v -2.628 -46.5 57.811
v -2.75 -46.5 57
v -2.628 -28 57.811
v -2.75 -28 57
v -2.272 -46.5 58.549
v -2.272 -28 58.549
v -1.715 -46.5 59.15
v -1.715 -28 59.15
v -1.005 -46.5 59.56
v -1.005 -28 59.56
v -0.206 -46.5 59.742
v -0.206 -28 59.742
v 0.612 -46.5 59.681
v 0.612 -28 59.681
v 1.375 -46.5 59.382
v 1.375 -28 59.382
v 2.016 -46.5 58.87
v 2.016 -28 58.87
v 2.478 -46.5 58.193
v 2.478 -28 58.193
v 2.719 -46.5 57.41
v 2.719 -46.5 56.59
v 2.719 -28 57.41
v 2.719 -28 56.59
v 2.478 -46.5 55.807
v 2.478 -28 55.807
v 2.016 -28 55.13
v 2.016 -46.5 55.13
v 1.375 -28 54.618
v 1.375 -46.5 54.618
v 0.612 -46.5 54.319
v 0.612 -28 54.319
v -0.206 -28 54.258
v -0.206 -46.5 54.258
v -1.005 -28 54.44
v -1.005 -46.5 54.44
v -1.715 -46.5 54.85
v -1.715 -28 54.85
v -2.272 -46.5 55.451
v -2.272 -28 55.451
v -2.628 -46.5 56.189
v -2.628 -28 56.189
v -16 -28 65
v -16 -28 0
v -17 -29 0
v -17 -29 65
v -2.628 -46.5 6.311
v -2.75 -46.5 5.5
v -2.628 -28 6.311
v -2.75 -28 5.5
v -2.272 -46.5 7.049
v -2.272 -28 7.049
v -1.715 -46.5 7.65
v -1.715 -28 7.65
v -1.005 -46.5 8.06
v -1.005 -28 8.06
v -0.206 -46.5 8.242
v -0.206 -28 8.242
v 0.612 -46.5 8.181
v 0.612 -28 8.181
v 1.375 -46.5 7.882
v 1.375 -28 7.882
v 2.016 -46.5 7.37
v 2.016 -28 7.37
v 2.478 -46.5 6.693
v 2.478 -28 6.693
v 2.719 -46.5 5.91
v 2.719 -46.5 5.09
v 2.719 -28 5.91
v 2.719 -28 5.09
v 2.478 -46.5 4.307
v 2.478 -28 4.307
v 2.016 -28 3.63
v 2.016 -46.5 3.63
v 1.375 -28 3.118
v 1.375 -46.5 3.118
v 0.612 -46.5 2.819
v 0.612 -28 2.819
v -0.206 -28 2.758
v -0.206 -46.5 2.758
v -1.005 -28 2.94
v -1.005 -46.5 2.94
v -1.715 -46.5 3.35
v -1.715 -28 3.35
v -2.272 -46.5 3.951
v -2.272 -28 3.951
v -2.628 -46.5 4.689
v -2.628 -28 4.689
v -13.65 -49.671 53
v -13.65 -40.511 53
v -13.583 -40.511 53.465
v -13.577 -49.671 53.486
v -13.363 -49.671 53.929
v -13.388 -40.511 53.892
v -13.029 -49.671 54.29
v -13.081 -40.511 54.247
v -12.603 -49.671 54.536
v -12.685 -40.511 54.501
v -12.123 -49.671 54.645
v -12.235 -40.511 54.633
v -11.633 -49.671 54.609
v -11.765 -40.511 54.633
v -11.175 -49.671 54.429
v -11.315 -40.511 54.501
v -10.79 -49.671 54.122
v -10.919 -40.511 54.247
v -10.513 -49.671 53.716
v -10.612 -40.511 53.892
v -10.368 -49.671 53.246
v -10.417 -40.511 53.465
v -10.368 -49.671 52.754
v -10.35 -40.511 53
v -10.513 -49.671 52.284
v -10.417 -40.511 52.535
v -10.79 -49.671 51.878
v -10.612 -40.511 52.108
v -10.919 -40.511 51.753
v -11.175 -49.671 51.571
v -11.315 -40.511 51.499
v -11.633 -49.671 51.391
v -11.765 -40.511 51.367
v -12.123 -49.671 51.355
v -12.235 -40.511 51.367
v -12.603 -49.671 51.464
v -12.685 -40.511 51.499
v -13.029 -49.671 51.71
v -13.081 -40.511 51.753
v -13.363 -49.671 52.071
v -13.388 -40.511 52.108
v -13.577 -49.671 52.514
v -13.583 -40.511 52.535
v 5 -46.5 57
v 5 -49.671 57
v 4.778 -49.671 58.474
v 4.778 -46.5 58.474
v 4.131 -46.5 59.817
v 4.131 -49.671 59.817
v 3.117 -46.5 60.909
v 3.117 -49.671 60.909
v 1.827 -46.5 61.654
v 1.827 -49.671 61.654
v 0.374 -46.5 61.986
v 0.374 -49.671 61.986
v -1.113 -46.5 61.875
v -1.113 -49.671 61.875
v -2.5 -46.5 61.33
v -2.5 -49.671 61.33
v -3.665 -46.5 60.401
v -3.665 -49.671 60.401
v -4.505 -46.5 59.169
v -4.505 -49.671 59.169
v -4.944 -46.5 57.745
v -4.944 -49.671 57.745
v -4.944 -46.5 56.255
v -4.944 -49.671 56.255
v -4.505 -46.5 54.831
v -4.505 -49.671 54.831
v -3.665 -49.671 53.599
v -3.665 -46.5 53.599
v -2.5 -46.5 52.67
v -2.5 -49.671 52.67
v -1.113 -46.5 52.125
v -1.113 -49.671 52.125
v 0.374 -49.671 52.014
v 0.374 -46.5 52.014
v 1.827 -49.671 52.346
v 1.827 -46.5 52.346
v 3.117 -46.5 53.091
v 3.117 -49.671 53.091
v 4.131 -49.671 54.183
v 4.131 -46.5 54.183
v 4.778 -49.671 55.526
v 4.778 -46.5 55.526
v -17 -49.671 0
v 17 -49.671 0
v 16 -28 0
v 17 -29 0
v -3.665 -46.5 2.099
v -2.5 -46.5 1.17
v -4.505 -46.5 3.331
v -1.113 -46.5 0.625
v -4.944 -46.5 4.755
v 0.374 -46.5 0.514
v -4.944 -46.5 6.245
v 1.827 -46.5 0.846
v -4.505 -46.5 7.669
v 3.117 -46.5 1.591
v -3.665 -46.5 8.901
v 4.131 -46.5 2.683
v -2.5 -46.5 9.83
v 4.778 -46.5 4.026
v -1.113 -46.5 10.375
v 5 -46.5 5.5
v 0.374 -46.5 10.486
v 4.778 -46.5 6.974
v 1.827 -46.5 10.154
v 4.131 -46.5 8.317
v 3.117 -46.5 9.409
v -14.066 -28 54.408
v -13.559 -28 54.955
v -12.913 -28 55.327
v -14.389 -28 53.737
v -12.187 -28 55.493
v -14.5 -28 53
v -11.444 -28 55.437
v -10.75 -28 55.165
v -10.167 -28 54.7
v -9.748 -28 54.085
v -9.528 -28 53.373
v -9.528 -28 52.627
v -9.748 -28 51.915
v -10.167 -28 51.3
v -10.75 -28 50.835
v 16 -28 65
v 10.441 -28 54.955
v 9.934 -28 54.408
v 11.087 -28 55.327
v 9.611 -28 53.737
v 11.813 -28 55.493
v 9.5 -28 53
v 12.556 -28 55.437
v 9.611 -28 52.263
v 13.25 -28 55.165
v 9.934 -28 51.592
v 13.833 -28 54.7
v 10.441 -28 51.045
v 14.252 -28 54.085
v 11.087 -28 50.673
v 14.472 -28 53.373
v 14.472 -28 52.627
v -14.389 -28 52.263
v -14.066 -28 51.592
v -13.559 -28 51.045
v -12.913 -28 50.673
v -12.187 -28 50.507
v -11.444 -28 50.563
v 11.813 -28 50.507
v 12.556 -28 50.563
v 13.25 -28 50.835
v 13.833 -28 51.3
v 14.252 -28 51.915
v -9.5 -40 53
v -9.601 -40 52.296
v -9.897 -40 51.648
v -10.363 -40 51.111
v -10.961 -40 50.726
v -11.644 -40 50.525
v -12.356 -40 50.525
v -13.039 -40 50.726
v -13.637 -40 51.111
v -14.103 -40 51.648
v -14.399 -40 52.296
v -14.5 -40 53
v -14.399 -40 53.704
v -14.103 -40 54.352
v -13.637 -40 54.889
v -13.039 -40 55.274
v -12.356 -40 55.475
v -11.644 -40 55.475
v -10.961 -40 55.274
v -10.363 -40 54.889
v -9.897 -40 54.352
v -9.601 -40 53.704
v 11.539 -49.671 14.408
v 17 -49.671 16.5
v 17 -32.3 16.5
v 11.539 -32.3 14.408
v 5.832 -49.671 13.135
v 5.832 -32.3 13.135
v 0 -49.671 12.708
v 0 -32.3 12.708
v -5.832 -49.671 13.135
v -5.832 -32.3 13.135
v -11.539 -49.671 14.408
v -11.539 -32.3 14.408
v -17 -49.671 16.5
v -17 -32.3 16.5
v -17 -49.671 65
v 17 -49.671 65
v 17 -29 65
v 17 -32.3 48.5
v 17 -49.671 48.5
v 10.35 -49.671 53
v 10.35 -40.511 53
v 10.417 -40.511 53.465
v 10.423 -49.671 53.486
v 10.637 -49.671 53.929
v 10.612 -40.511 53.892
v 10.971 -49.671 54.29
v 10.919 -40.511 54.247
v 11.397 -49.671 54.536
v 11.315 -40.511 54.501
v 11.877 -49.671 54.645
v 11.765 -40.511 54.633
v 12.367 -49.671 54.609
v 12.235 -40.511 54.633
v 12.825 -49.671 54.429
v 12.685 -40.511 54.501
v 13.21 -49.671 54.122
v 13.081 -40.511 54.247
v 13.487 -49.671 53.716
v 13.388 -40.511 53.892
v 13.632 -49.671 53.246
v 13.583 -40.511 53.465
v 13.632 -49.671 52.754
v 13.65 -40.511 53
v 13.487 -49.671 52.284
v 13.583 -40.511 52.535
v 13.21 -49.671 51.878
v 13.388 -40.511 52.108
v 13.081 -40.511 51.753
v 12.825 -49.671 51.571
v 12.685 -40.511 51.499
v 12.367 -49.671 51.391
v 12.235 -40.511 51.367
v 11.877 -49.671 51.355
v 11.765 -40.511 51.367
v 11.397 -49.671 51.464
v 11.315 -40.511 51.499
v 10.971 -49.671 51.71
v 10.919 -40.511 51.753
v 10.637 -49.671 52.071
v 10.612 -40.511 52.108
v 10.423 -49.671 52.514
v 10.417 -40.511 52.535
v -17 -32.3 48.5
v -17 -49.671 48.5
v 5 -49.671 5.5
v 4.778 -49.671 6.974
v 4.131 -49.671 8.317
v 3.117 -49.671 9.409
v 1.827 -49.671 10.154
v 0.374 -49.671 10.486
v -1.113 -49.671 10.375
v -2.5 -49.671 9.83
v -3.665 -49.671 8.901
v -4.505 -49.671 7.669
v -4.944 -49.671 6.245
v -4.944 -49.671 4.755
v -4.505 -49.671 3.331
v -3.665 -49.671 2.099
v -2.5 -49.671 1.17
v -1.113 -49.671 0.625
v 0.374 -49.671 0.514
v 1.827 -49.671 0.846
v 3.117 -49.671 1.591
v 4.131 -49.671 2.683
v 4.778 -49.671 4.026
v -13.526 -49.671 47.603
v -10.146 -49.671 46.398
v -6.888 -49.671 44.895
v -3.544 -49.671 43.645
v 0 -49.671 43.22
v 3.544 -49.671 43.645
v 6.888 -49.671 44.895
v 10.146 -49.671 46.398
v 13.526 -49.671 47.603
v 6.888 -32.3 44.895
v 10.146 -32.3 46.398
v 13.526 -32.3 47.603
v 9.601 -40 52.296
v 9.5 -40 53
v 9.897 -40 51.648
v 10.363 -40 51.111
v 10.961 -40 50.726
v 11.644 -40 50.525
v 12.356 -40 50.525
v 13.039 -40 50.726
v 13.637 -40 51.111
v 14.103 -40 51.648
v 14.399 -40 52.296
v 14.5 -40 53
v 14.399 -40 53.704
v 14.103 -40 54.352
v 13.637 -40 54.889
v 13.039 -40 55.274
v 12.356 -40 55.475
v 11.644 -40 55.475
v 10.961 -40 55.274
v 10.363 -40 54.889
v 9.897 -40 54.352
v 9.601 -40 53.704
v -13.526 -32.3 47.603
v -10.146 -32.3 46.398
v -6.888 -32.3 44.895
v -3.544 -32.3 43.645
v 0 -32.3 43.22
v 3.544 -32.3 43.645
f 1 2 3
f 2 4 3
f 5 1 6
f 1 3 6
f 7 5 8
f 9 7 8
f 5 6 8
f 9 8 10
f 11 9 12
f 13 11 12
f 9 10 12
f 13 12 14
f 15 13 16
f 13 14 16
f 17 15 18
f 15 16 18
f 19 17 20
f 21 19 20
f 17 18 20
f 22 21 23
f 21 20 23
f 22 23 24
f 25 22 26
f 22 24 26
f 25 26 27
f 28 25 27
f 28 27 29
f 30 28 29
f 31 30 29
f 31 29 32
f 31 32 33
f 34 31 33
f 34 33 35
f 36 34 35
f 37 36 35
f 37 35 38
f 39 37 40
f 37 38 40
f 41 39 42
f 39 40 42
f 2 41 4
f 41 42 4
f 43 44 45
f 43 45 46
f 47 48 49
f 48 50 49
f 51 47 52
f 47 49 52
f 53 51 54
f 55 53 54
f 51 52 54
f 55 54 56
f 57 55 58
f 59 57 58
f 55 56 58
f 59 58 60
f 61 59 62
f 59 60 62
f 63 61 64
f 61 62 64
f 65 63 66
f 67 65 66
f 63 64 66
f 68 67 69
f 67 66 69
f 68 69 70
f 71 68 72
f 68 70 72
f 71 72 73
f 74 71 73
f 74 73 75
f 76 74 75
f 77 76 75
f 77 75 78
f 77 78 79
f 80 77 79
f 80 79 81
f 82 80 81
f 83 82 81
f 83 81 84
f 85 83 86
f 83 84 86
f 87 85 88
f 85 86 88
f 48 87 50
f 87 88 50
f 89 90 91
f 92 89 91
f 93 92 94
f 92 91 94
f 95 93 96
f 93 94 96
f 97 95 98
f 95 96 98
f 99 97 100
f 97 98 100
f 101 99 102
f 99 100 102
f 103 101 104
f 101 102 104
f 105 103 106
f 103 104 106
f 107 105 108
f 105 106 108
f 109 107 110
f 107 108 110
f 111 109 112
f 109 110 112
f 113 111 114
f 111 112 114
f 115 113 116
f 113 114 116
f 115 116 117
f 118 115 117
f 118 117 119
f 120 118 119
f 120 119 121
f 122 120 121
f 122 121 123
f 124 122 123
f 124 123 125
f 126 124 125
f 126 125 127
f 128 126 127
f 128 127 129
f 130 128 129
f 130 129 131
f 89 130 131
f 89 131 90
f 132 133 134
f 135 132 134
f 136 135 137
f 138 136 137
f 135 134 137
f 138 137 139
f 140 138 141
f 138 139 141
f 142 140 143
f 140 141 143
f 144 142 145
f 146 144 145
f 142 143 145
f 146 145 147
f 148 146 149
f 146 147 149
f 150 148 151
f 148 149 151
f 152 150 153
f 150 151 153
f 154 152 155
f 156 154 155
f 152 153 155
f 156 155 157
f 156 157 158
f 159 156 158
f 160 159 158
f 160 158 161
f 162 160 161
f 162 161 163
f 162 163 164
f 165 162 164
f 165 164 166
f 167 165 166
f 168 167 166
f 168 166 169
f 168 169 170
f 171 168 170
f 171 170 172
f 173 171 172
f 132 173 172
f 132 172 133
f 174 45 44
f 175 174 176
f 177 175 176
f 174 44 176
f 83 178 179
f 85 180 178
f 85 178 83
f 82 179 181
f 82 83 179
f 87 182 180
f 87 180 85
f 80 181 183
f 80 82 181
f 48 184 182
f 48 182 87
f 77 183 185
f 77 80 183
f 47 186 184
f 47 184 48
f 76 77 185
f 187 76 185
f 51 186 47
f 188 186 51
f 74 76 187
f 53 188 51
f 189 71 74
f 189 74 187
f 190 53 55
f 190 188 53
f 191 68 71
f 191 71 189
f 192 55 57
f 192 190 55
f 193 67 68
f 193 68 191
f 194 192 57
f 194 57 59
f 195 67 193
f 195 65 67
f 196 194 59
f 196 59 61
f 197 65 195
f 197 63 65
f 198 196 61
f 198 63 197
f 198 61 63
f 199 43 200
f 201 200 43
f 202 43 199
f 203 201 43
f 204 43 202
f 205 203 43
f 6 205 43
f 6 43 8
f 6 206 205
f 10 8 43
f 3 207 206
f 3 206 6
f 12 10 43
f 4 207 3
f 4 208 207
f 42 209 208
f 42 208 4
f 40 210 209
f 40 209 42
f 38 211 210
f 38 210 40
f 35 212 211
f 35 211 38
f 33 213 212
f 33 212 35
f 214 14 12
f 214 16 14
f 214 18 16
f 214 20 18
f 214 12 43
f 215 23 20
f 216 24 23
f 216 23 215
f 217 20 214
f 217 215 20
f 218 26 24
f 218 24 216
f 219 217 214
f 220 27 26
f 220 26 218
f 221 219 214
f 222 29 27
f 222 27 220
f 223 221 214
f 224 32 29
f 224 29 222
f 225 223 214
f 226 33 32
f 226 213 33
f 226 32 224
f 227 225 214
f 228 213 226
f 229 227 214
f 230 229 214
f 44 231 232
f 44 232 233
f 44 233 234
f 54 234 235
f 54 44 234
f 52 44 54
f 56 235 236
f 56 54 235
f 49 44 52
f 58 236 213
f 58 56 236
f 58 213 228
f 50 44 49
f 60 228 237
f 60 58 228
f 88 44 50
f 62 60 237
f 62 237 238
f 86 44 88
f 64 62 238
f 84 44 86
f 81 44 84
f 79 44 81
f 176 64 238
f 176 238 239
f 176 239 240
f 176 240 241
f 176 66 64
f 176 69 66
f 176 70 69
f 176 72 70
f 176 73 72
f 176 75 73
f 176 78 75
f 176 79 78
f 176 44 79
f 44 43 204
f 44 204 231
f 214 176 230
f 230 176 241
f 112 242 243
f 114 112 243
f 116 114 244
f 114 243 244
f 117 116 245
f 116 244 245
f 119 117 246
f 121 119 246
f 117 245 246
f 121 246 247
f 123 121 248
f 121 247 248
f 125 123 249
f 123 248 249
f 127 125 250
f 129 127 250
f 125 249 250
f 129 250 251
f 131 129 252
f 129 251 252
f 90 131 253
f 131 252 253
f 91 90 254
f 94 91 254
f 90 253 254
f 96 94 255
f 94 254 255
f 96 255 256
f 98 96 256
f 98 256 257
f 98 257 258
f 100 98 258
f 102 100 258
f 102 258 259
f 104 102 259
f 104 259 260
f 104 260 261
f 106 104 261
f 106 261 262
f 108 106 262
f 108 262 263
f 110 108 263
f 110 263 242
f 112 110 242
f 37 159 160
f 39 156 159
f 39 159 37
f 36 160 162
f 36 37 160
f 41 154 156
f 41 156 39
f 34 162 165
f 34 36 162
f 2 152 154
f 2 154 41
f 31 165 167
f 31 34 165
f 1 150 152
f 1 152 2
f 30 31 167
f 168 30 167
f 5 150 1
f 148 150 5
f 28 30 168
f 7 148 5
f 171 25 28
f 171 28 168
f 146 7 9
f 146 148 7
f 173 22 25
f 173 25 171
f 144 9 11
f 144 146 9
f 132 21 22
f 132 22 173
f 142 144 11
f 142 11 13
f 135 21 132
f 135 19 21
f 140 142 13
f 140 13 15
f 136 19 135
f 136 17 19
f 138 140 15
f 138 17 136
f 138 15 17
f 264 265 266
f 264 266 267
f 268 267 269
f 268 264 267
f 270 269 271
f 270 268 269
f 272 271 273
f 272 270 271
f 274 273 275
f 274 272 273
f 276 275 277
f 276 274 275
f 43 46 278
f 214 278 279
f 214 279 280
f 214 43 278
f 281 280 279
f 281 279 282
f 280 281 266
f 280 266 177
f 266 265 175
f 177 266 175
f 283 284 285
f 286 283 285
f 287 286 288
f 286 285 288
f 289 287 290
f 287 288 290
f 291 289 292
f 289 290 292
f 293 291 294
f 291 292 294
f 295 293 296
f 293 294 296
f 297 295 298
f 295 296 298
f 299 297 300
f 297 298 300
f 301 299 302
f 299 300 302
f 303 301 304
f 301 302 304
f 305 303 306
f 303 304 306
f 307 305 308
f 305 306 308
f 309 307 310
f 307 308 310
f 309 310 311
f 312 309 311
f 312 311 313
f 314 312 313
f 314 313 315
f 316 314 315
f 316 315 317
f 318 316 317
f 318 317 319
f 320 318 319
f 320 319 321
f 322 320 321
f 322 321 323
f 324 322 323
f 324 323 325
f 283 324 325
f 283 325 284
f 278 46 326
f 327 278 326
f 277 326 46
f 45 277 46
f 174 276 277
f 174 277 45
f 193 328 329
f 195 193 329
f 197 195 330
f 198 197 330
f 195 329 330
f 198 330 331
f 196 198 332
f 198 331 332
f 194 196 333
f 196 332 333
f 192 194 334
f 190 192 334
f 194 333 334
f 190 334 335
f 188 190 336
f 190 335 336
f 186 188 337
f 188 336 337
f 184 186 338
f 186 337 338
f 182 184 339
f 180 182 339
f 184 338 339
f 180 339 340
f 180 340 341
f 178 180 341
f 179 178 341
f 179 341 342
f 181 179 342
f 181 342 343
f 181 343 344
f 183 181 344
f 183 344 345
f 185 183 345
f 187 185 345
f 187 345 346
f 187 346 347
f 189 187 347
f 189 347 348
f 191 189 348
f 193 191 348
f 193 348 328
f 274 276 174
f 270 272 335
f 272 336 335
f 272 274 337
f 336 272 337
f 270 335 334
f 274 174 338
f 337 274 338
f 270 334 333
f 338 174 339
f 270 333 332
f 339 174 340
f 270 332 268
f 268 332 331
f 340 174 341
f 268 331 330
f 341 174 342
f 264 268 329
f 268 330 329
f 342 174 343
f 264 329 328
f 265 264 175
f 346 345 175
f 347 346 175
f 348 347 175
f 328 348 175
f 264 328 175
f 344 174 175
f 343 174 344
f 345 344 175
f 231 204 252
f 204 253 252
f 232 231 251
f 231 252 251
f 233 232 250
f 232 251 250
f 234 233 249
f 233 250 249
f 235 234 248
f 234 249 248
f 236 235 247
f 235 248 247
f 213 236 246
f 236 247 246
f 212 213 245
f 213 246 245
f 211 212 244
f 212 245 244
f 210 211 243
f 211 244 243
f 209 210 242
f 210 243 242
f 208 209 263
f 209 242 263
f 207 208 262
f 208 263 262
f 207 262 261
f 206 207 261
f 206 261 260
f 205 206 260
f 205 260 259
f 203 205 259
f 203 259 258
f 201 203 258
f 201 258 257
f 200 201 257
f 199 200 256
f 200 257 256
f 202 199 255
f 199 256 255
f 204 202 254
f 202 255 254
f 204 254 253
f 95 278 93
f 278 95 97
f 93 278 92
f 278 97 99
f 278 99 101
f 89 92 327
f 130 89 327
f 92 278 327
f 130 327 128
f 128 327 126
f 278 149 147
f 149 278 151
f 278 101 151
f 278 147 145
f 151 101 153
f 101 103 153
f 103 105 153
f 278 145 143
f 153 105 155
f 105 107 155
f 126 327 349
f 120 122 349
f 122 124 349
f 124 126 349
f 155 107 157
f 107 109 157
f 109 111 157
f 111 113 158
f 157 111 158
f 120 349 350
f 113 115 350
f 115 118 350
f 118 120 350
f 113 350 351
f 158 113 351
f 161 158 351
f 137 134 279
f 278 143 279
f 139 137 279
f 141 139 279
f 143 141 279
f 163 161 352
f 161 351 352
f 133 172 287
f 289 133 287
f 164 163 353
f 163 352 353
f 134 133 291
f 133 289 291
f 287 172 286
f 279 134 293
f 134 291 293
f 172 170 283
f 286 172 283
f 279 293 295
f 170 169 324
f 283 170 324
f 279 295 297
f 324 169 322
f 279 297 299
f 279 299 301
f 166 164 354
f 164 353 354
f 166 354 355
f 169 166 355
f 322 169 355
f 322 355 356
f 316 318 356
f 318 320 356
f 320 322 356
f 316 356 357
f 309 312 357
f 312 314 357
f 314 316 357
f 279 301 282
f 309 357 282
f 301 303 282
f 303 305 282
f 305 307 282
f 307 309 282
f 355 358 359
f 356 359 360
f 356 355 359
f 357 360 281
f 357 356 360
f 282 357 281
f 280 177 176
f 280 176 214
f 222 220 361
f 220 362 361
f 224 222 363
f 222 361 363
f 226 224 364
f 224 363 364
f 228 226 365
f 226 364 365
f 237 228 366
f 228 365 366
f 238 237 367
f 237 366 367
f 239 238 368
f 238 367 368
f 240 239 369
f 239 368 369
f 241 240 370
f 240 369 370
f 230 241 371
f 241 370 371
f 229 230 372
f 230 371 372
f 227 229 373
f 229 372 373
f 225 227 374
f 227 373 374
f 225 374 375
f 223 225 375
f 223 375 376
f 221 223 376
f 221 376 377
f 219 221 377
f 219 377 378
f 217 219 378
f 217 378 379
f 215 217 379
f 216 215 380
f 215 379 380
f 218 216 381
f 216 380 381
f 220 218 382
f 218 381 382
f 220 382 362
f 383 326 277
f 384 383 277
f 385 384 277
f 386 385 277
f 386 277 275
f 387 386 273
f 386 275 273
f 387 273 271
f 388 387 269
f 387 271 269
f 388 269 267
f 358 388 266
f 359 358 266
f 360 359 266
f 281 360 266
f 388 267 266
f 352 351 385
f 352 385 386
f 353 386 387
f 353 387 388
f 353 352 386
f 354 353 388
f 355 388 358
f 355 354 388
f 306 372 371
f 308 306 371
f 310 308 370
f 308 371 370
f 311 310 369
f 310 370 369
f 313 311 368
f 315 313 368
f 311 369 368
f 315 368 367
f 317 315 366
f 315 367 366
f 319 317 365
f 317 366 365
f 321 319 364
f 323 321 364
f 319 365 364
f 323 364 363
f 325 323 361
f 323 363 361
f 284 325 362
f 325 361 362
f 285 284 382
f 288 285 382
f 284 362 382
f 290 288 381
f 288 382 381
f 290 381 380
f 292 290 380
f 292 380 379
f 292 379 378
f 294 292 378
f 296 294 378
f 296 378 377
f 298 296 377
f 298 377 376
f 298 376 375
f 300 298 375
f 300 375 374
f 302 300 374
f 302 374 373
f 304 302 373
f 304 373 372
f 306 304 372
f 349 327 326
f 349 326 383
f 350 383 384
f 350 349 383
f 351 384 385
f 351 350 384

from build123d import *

# Parameters (mm, degrees)
SKIZZE1_R                                            = 52.5
SKIZZE1_R_2                                          = 17.5
AUFSATZ_LINEAR_AUSTRAGEN1_DEPTH                      = 65
SKIZZE18_W                                           = 35.5
SKIZZE18_H                                           = 65
SCHNITT_LINEAR_AUSTRAGEN11_DEPTH                     = 106
SKIZZE25_W                                           = 34
SKIZZE25_H                                           = 81
SCHNITT_LINEAR_AUSTRAGEN12_DEPTH                     = 66
F_5_0_5_DURCHMESSER_BOHRUNG1_D                       = 5
F_5_0_5_DURCHMESSER_BOHRUNG1_DEPTH                   = 12
F_5_0_5_DURCHMESSER_BOHRUNG1_TIP                     = 1.502151548
M4_GEWINDEBOHRUNG1_D                                 = 3.3
STIRNSENKUNG_F_R_M5_ZYLINDERSCHRAUBE_MIT_D           = 5.5
STIRNSENKUNG_F_R_M5_ZYLINDERSCHRAUBE_MIT_CBORE_D     = 10
STIRNSENKUNG_F_R_M5_ZYLINDERSCHRAUBE_MIT_CBORE_DEPTH = 6
FASE1_SIZE                                           = 1
CUT_EXTRUDE1_DEPTH                                   = 20.2
SKETCH1_W                                            = 34
SKETCH1_H                                            = 65
CUT_EXTRUDE2_DEPTH                                   = 2.82858


with BuildPart() as part:
    # Skizze1 → Aufsatz-Linear austragen1 (new body)
    with BuildSketch(Plane.XY):
        Circle(SKIZZE1_R)
        Circle(SKIZZE1_R_2, mode=Mode.SUBTRACT)
    extrude(amount=AUFSATZ_LINEAR_AUSTRAGEN1_DEPTH)

    # Skizze18 → Schnitt-Linear austragen11 (cut, through all)
    with BuildSketch(Plane(origin=(0, -52.5, 0), x_dir=(1, 0, 0), z_dir=(0, 1, 0))):
        with Locations((-34.75, -32.5)):
            Rectangle(SKIZZE18_W, SKIZZE18_H)
        with Locations((34.75, -32.5)):
            Rectangle(SKIZZE18_W, SKIZZE18_H)
    extrude(amount=SCHNITT_LINEAR_AUSTRAGEN11_DEPTH, mode=Mode.SUBTRACT)

    # Skizze25 → Schnitt-Linear austragen12 (cut, through all)
    with BuildSketch(Plane.XY):
        with Locations((0, 12.5)):
            Rectangle(SKIZZE25_W, SKIZZE25_H)
    extrude(amount=SCHNITT_LINEAR_AUSTRAGEN12_DEPTH, mode=Mode.SUBTRACT)

    # 5.0 _5_ Durchmesser Bohrung1
    with Locations(Plane(origin=(0, -28, 0), x_dir=(1, 0, 0), z_dir=(0, 1, 0))):
        with Locations((12, -53), (-12, -53)):
            Hole(F_5_0_5_DURCHMESSER_BOHRUNG1_D / 2, depth=F_5_0_5_DURCHMESSER_BOHRUNG1_DEPTH)
            with Locations((0, 0, -(F_5_0_5_DURCHMESSER_BOHRUNG1_DEPTH + F_5_0_5_DURCHMESSER_BOHRUNG1_TIP / 2))):  # 118° drill point
                Cone(0, F_5_0_5_DURCHMESSER_BOHRUNG1_D / 2, F_5_0_5_DURCHMESSER_BOHRUNG1_TIP, mode=Mode.SUBTRACT)

    # M4 Gewindebohrung1 (through all)
    with Locations(Plane.XZ.offset(52.5)):
        with Locations((-12, 53), (12, 53)):
            Hole(M4_GEWINDEBOHRUNG1_D / 2)

    # Stirnsenkung f_r M5 Zylinderschraube mit (through all)
    with Locations(Plane.XZ.offset(52.5)):
        with Locations((0, 5.5), (0, 57)):
            CounterBoreHole(STIRNSENKUNG_F_R_M5_ZYLINDERSCHRAUBE_MIT_D / 2, STIRNSENKUNG_F_R_M5_ZYLINDERSCHRAUBE_MIT_CBORE_D / 2, STIRNSENKUNG_F_R_M5_ZYLINDERSCHRAUBE_MIT_CBORE_DEPTH)

    # Fase1
    fase1_edges = [part.edges().sort_by_distance(p)[0] for p in [
        (-17, -28, 32.5),
        (17, -28, 32.5),
    ]]
    chamfer(fase1_edges, length=FASE1_SIZE)

    # Skizze3_2 → Cut-Extrude1 (cut)
    with BuildSketch(Plane(origin=(0, -52.5, 0), x_dir=(1, 0, 0), z_dir=(0, 1, 0))):
        with BuildLine():
            Line((17, -48.5), (17, -16.5))
            ThreePointArc((17, -16.5), (0, -12.70773398), (-17, -16.5))
            Line((-17, -16.5), (-17, -48.5))
            ThreePointArc((-17, -48.5), (-11.82232192, -47.038215467), (-6.887645327, -44.894823008))
            ThreePointArc((-6.887645327, -44.894823008), (0, -43.22), (6.887645327, -44.894823008))
            ThreePointArc((6.887645327, -44.894823008), (11.82232192, -47.038215467), (17, -48.5))
        make_face()
    extrude(amount=CUT_EXTRUDE1_DEPTH, mode=Mode.SUBTRACT)

    # Sketch1 → Cut-Extrude2 (cut)
    with BuildSketch(Plane(origin=(0, -52.5, 0), x_dir=(1, 0, 0), z_dir=(0, 1, 0))):
        with Locations((0, -32.5)):
            Rectangle(SKETCH1_W, SKETCH1_H)
    extrude(amount=CUT_EXTRUDE2_DEPTH, mode=Mode.SUBTRACT)


solid = part.part
